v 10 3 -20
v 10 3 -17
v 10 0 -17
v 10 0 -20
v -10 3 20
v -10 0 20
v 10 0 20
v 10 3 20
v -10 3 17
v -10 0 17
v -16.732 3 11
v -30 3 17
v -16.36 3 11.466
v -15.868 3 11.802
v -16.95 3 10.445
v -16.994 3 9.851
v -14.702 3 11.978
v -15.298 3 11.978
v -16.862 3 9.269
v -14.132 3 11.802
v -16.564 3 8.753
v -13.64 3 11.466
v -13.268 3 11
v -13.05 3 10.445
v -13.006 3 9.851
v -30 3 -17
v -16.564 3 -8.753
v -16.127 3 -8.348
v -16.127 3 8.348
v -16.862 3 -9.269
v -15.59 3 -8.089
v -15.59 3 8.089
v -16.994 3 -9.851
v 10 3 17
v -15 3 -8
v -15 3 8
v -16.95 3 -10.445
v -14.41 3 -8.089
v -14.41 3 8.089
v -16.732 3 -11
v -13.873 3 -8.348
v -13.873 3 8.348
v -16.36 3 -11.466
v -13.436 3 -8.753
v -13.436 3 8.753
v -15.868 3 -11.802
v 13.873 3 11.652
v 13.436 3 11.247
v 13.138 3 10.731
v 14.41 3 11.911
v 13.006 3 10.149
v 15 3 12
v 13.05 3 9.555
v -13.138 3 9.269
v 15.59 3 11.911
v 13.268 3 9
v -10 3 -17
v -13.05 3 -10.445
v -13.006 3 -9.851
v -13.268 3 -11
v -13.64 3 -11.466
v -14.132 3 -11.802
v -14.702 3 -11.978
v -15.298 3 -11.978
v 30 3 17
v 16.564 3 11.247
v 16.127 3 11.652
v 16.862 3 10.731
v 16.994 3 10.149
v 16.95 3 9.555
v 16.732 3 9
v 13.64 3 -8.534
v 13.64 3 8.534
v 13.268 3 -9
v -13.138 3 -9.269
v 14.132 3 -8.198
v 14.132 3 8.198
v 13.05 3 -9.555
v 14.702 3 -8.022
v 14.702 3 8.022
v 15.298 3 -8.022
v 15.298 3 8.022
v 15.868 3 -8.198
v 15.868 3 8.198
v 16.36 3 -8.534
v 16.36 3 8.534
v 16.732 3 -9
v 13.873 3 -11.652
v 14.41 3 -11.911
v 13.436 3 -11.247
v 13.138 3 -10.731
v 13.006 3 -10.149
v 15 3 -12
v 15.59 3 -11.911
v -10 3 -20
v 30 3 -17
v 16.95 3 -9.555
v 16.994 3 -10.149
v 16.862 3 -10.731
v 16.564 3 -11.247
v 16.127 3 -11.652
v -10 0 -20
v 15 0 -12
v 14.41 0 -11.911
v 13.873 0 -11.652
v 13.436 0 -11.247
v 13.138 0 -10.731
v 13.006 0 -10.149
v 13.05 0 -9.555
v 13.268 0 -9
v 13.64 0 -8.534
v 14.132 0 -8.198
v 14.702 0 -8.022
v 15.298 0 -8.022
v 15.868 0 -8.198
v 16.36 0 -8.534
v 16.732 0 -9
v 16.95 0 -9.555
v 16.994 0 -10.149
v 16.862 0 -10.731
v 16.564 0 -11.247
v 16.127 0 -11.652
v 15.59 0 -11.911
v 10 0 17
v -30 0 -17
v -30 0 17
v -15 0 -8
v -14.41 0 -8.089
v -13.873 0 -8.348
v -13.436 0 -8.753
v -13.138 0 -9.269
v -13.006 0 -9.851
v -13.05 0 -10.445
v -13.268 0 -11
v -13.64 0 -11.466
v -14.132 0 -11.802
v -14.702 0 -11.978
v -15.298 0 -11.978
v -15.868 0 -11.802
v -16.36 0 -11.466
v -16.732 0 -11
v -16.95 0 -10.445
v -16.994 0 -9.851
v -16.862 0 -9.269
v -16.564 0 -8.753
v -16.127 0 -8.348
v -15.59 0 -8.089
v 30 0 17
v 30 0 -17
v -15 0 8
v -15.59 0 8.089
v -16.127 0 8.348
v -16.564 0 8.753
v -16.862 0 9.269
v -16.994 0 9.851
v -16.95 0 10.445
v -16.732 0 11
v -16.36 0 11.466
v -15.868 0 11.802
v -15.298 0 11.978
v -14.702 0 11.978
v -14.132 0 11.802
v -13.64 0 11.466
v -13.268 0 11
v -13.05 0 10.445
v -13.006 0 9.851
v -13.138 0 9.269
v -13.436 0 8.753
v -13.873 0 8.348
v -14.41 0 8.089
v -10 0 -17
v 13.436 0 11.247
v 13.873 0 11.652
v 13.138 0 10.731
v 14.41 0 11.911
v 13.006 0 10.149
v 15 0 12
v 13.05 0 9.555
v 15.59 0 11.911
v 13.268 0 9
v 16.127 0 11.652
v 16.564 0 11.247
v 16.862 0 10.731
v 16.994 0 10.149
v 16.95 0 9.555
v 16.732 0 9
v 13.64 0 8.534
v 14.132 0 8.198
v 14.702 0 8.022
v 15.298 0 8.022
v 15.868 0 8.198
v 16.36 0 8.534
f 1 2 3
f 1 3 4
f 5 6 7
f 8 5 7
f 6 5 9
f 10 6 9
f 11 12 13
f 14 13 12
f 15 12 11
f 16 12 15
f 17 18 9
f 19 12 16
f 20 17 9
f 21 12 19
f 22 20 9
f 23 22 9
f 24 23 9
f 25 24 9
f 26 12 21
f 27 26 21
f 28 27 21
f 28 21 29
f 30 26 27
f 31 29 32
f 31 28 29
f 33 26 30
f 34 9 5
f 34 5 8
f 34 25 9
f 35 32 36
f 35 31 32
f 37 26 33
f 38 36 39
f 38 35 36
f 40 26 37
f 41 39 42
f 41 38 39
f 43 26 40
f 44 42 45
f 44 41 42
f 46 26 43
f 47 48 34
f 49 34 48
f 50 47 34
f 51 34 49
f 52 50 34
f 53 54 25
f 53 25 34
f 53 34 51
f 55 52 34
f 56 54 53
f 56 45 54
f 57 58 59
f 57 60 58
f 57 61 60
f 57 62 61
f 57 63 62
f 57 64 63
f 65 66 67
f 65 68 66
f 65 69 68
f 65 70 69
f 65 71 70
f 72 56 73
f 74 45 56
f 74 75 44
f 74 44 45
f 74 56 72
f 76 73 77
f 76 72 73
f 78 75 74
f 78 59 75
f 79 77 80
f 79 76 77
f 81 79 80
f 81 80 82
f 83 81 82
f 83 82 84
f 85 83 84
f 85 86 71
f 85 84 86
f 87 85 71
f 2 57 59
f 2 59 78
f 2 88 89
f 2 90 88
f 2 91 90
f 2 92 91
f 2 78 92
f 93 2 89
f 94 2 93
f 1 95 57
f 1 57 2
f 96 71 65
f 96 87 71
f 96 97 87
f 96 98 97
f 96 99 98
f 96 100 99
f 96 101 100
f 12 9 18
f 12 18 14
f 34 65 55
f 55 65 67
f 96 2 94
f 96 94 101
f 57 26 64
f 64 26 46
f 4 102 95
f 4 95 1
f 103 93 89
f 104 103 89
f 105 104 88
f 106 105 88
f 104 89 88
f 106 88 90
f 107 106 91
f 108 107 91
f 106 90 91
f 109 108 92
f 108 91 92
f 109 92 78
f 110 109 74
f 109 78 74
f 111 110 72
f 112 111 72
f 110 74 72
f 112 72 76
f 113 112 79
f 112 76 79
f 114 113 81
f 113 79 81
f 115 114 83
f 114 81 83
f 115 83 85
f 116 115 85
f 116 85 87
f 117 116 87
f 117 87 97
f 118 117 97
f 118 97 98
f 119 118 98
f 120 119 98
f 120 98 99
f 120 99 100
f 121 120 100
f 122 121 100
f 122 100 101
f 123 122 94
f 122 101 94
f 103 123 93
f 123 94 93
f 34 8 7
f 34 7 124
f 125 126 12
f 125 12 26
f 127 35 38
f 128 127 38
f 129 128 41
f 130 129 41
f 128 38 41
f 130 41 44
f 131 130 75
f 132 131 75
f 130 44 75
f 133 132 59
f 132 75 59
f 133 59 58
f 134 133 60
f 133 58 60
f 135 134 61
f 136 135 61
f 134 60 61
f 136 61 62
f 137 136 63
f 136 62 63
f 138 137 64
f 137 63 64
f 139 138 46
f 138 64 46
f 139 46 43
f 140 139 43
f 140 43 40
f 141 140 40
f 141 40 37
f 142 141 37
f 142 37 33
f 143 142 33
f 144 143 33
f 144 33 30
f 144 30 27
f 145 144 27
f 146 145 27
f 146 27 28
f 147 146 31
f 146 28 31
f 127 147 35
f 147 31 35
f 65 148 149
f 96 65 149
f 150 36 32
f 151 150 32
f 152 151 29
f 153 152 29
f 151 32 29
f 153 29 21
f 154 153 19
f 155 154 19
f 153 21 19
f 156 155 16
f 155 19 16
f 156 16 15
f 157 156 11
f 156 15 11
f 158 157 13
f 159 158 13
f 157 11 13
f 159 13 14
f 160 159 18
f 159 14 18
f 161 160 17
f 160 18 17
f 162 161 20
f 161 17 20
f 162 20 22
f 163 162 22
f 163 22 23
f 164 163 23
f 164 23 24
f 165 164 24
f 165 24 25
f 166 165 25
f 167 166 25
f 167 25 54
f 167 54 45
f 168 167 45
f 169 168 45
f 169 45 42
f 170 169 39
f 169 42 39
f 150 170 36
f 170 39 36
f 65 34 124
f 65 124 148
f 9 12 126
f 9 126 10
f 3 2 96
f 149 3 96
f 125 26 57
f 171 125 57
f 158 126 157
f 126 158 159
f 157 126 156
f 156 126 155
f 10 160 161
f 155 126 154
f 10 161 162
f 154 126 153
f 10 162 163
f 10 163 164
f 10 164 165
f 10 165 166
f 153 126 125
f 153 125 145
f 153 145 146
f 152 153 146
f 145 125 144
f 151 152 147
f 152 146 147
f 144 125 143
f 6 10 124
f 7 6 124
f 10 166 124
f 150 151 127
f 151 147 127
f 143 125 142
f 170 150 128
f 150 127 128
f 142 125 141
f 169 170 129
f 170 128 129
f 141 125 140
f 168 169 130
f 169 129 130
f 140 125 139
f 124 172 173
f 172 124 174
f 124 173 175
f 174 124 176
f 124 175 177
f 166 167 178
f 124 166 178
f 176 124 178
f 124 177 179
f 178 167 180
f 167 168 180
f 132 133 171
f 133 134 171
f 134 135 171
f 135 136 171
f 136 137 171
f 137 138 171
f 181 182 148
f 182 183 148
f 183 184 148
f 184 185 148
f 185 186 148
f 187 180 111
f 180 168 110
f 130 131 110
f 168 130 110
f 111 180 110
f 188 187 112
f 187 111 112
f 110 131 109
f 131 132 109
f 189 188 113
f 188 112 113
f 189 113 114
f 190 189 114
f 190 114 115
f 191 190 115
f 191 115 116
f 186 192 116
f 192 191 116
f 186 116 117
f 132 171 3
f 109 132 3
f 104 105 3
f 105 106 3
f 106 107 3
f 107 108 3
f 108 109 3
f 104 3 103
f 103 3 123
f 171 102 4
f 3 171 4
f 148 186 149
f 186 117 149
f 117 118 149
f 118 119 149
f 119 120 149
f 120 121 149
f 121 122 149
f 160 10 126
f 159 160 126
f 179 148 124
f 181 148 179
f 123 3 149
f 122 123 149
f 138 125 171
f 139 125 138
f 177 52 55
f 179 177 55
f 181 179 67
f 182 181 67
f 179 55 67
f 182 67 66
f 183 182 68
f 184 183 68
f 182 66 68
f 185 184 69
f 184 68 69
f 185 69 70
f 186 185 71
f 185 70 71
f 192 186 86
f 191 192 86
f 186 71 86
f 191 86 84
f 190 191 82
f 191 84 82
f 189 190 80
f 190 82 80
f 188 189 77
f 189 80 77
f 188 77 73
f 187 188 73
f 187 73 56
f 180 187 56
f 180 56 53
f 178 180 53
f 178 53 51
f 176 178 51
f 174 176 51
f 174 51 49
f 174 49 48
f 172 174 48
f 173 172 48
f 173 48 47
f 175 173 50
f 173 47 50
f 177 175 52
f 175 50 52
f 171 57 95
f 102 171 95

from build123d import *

# Parameters (mm, degrees)
SKETCH1_W           = 60
SKETCH1_H           = 40
BOSS_EXTRUDE1_DEPTH = 3
SKETCH2_W           = 20
SKETCH2_H           = 6
CUT_EXTRUDE1_DEPTH  = 3
SKETCH3_R           = 2
CUT_EXTRUDE2_DEPTH  = 3


with BuildPart() as part:
    # Sketch1 → Boss-Extrude1 (new body)
    with BuildSketch(Plane(origin=(0, 0, 0), x_dir=(1, 0, 0), z_dir=(0, 1, 0))):
        Rectangle(SKETCH1_W, SKETCH1_H)
    extrude(amount=BOSS_EXTRUDE1_DEPTH)

    # Sketch2 → Cut-Extrude1 (cut)
    with BuildSketch(Plane(origin=(0, 3, 0), x_dir=(1, 0, 0), z_dir=(0, 1, 0))):
        with Locations((-20, -20)):
            Rectangle(SKETCH2_W, SKETCH2_H)
        with Locations((20, -20)):
            Rectangle(SKETCH2_W, SKETCH2_H)
        with Locations((20, 20)):
            Rectangle(SKETCH2_W, SKETCH2_H)
        with Locations((-20, 20)):
            Rectangle(SKETCH2_W, SKETCH2_H)
    extrude(amount=-CUT_EXTRUDE1_DEPTH, mode=Mode.SUBTRACT)

    # Sketch3 → Cut-Extrude2 (cut)
    with BuildSketch(Plane(origin=(0, 3, 0), x_dir=(1, 0, 0), z_dir=(0, 1, 0))):
        with Locations(Location((-15, 10, 0), (0, 0, 270))):
            Circle(SKETCH3_R)
        with Locations(Location((-15, -10, 0), (0, 0, 90))):
            Circle(SKETCH3_R)
        with Locations(Location((15, -10, 0), (0, 0, 270))):
            Circle(SKETCH3_R)
        with Locations(Location((15, 10, 0), (0, 0, 90))):
            Circle(SKETCH3_R)
    extrude(amount=-CUT_EXTRUDE2_DEPTH, mode=Mode.SUBTRACT)


solid = part.part
